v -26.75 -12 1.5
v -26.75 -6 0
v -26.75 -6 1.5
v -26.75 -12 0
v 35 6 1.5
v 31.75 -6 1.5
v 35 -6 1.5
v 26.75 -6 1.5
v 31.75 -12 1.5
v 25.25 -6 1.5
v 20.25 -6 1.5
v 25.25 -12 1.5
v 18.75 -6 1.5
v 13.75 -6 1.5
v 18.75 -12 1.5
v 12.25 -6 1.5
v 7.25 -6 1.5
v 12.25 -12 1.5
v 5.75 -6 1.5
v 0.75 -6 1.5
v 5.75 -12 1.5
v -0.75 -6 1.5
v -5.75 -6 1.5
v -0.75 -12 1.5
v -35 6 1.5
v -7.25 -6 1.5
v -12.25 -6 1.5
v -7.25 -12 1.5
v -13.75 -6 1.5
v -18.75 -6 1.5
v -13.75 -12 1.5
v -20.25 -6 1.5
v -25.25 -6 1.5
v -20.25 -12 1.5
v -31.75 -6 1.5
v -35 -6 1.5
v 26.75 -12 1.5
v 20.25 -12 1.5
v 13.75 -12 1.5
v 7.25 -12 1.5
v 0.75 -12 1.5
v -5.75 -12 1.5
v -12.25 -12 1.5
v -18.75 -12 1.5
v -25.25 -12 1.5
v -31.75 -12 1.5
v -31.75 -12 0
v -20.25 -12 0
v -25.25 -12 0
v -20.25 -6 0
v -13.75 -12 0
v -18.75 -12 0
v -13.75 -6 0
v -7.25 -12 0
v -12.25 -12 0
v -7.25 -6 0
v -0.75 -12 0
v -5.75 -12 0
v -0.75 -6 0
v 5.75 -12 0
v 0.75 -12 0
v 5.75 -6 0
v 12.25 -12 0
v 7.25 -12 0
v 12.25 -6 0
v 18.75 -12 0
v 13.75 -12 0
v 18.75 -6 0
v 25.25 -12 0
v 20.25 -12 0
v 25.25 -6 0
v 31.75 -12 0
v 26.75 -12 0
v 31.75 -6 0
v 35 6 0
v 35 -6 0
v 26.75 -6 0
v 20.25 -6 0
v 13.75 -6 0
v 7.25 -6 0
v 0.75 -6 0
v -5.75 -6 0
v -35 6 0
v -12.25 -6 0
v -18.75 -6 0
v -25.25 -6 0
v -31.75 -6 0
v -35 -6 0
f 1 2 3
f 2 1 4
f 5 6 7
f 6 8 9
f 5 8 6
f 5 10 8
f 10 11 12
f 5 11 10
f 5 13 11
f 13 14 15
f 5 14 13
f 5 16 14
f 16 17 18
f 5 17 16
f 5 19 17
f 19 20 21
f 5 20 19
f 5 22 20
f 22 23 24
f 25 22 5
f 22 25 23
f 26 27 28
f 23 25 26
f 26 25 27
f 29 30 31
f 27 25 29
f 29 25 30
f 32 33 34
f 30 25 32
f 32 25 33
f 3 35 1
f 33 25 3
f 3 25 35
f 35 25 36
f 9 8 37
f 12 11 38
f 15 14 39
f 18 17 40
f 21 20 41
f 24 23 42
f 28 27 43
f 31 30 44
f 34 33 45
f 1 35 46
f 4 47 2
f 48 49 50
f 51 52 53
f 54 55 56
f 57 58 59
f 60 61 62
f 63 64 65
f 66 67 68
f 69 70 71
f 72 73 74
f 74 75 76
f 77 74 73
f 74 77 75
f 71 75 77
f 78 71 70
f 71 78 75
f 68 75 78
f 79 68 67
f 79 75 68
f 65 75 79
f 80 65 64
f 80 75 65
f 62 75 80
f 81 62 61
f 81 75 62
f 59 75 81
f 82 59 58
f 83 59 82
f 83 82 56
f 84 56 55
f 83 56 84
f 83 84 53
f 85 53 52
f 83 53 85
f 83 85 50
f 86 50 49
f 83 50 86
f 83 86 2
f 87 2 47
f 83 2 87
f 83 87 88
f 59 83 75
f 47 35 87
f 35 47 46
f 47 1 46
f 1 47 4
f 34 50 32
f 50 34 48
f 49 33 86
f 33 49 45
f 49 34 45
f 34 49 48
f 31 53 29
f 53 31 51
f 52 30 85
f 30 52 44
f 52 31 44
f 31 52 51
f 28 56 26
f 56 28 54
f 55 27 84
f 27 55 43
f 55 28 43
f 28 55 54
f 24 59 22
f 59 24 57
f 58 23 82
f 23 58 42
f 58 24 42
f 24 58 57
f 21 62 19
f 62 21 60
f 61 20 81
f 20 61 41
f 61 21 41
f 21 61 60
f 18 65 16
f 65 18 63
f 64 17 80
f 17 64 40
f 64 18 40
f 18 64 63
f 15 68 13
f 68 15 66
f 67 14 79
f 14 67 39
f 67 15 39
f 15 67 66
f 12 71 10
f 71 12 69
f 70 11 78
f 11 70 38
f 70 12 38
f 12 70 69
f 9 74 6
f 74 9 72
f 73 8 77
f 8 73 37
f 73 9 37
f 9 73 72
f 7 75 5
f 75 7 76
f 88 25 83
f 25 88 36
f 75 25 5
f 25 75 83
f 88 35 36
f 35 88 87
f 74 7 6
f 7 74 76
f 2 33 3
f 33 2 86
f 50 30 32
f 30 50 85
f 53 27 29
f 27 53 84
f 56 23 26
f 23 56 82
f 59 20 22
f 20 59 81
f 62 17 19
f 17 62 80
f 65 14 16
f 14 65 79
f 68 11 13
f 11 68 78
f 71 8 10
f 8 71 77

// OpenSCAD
// 10-Well Agarose Gel Comb
// Designed for FDM printing, lying flat on the XY plane.

// --- Dimensions ---
plate_length = 70.0;       // X dimension of the spine
plate_width = 12.0;        // Y dimension of the spine
plate_thickness = 1.5;     // Z dimension (height of the plate)

num_teeth = 10;            // Number of teeth
tooth_width = 5.0;         // X dimension of each tooth
tooth_length = 12.0;       // Y dimension of each tooth (extending from spine)
gap_width = 1.5;           // Y dimension of the gap between teeth

// --- Derived Calculations ---
// Total width of the tooth array (from start of first tooth to end of last tooth)
// Total width = (num_teeth * tooth_width) + ((num_teeth - 1) * gap_width)
// However, the prompt implies the teeth are rectangular and the gaps are between them.
// Let's calculate the total span of the teeth to center them on the X axis.
total_teeth_span = (num_teeth * tooth_width) + ((num_teeth - 1) * gap_width);

// The teeth extend in the -Y direction from the spine.
// Since the plate is 12mm wide and teeth are 12mm long, 
// the teeth will align with the edge of the plate.

// --- Rendering Settings ---
$fn = 64;

// --- Geometry Construction ---

module comb() {
    difference() {
        // Main Plate Body
        // Centered on X and Y, resting on Z=0
        translate([-plate_length/2, -plate_width/2, 0])
            cube([plate_length, plate_width, plate_thickness]);

        // Subtracting the teeth (the wells)
        // We create the "negative" space where the agarose will sit.
        // The teeth hang from one long edge in the -Y direction.
        // To make the teeth "hang" from the edge, we subtract rectangular prisms.
        
        // Calculate starting X to center the array of teeth on the plate
        start_x = -total_teeth_span / 2;
        
        // We subtract the teeth from the plate. 
        // Note: The prompt says "teeth hang from one long edge... in the -Y direction".
        // In OpenSCAD, to create a "comb", we subtract the tooth shapes from the plate.
        // However, a comb usually has teeth protruding. 
        // If the plate is 1.5mm thick and teeth are 12mm long, 
        // the teeth must be part of the geometry, not holes.
        // Re-reading: "10 rectangular teeth that hang from one long edge of the spine".
        // This means the teeth are ADDED geometry, and the "wells" are the gaps.
        // But a comb for casting is usually a solid block with slots cut into it.
        // If the plate is 1.5mm thick, the "teeth" are the parts that stick out.
        // Let's model it as a plate with teeth protruding from the edge.
    }
}

// Corrected approach: 
// The "spine" is the base plate. 
// The "teeth" are the protrusions.
// The "wells" are the spaces between the teeth.
// To cast a gel, the teeth are the solid parts, and the gaps are the wells.

union() {
    // The Spine (Base Plate)
    translate([-plate_length/2, -plate_width/2, 0])
        cube([plate_length, plate_width, plate_thickness]);

    // The Teeth
    // They hang from one long edge (-Y direction)
    // We will place them starting from the edge of the spine.
    // Since the spine is 12mm wide and teeth are 12mm long, 
    // and they hang in -Y, the teeth will extend from Y = -12 to Y = 0.
    
    start_x = -total_teeth_span / 2;
    
    for (i = [0 : num_teeth - 1]) {
        // Calculate X position for this tooth
        // Each tooth is tooth_width, followed by gap_width
        current_x = start_x + (i * (tooth_width + gap_width));
        
        translate([current_x, -tooth_length, 0])
            cube([tooth_width, tooth_length, plate_thickness]);
    }
}

// Note on orientation:
// The plate is 70x12. The teeth are 5x12.
// The teeth are centered on X.
// The teeth extend from the edge of the plate in the -Y direction.
// Total footprint in Y: plate_width (12) + tooth_length (12) = 24mm.
// Total footprint in X: plate_length (70mm).
